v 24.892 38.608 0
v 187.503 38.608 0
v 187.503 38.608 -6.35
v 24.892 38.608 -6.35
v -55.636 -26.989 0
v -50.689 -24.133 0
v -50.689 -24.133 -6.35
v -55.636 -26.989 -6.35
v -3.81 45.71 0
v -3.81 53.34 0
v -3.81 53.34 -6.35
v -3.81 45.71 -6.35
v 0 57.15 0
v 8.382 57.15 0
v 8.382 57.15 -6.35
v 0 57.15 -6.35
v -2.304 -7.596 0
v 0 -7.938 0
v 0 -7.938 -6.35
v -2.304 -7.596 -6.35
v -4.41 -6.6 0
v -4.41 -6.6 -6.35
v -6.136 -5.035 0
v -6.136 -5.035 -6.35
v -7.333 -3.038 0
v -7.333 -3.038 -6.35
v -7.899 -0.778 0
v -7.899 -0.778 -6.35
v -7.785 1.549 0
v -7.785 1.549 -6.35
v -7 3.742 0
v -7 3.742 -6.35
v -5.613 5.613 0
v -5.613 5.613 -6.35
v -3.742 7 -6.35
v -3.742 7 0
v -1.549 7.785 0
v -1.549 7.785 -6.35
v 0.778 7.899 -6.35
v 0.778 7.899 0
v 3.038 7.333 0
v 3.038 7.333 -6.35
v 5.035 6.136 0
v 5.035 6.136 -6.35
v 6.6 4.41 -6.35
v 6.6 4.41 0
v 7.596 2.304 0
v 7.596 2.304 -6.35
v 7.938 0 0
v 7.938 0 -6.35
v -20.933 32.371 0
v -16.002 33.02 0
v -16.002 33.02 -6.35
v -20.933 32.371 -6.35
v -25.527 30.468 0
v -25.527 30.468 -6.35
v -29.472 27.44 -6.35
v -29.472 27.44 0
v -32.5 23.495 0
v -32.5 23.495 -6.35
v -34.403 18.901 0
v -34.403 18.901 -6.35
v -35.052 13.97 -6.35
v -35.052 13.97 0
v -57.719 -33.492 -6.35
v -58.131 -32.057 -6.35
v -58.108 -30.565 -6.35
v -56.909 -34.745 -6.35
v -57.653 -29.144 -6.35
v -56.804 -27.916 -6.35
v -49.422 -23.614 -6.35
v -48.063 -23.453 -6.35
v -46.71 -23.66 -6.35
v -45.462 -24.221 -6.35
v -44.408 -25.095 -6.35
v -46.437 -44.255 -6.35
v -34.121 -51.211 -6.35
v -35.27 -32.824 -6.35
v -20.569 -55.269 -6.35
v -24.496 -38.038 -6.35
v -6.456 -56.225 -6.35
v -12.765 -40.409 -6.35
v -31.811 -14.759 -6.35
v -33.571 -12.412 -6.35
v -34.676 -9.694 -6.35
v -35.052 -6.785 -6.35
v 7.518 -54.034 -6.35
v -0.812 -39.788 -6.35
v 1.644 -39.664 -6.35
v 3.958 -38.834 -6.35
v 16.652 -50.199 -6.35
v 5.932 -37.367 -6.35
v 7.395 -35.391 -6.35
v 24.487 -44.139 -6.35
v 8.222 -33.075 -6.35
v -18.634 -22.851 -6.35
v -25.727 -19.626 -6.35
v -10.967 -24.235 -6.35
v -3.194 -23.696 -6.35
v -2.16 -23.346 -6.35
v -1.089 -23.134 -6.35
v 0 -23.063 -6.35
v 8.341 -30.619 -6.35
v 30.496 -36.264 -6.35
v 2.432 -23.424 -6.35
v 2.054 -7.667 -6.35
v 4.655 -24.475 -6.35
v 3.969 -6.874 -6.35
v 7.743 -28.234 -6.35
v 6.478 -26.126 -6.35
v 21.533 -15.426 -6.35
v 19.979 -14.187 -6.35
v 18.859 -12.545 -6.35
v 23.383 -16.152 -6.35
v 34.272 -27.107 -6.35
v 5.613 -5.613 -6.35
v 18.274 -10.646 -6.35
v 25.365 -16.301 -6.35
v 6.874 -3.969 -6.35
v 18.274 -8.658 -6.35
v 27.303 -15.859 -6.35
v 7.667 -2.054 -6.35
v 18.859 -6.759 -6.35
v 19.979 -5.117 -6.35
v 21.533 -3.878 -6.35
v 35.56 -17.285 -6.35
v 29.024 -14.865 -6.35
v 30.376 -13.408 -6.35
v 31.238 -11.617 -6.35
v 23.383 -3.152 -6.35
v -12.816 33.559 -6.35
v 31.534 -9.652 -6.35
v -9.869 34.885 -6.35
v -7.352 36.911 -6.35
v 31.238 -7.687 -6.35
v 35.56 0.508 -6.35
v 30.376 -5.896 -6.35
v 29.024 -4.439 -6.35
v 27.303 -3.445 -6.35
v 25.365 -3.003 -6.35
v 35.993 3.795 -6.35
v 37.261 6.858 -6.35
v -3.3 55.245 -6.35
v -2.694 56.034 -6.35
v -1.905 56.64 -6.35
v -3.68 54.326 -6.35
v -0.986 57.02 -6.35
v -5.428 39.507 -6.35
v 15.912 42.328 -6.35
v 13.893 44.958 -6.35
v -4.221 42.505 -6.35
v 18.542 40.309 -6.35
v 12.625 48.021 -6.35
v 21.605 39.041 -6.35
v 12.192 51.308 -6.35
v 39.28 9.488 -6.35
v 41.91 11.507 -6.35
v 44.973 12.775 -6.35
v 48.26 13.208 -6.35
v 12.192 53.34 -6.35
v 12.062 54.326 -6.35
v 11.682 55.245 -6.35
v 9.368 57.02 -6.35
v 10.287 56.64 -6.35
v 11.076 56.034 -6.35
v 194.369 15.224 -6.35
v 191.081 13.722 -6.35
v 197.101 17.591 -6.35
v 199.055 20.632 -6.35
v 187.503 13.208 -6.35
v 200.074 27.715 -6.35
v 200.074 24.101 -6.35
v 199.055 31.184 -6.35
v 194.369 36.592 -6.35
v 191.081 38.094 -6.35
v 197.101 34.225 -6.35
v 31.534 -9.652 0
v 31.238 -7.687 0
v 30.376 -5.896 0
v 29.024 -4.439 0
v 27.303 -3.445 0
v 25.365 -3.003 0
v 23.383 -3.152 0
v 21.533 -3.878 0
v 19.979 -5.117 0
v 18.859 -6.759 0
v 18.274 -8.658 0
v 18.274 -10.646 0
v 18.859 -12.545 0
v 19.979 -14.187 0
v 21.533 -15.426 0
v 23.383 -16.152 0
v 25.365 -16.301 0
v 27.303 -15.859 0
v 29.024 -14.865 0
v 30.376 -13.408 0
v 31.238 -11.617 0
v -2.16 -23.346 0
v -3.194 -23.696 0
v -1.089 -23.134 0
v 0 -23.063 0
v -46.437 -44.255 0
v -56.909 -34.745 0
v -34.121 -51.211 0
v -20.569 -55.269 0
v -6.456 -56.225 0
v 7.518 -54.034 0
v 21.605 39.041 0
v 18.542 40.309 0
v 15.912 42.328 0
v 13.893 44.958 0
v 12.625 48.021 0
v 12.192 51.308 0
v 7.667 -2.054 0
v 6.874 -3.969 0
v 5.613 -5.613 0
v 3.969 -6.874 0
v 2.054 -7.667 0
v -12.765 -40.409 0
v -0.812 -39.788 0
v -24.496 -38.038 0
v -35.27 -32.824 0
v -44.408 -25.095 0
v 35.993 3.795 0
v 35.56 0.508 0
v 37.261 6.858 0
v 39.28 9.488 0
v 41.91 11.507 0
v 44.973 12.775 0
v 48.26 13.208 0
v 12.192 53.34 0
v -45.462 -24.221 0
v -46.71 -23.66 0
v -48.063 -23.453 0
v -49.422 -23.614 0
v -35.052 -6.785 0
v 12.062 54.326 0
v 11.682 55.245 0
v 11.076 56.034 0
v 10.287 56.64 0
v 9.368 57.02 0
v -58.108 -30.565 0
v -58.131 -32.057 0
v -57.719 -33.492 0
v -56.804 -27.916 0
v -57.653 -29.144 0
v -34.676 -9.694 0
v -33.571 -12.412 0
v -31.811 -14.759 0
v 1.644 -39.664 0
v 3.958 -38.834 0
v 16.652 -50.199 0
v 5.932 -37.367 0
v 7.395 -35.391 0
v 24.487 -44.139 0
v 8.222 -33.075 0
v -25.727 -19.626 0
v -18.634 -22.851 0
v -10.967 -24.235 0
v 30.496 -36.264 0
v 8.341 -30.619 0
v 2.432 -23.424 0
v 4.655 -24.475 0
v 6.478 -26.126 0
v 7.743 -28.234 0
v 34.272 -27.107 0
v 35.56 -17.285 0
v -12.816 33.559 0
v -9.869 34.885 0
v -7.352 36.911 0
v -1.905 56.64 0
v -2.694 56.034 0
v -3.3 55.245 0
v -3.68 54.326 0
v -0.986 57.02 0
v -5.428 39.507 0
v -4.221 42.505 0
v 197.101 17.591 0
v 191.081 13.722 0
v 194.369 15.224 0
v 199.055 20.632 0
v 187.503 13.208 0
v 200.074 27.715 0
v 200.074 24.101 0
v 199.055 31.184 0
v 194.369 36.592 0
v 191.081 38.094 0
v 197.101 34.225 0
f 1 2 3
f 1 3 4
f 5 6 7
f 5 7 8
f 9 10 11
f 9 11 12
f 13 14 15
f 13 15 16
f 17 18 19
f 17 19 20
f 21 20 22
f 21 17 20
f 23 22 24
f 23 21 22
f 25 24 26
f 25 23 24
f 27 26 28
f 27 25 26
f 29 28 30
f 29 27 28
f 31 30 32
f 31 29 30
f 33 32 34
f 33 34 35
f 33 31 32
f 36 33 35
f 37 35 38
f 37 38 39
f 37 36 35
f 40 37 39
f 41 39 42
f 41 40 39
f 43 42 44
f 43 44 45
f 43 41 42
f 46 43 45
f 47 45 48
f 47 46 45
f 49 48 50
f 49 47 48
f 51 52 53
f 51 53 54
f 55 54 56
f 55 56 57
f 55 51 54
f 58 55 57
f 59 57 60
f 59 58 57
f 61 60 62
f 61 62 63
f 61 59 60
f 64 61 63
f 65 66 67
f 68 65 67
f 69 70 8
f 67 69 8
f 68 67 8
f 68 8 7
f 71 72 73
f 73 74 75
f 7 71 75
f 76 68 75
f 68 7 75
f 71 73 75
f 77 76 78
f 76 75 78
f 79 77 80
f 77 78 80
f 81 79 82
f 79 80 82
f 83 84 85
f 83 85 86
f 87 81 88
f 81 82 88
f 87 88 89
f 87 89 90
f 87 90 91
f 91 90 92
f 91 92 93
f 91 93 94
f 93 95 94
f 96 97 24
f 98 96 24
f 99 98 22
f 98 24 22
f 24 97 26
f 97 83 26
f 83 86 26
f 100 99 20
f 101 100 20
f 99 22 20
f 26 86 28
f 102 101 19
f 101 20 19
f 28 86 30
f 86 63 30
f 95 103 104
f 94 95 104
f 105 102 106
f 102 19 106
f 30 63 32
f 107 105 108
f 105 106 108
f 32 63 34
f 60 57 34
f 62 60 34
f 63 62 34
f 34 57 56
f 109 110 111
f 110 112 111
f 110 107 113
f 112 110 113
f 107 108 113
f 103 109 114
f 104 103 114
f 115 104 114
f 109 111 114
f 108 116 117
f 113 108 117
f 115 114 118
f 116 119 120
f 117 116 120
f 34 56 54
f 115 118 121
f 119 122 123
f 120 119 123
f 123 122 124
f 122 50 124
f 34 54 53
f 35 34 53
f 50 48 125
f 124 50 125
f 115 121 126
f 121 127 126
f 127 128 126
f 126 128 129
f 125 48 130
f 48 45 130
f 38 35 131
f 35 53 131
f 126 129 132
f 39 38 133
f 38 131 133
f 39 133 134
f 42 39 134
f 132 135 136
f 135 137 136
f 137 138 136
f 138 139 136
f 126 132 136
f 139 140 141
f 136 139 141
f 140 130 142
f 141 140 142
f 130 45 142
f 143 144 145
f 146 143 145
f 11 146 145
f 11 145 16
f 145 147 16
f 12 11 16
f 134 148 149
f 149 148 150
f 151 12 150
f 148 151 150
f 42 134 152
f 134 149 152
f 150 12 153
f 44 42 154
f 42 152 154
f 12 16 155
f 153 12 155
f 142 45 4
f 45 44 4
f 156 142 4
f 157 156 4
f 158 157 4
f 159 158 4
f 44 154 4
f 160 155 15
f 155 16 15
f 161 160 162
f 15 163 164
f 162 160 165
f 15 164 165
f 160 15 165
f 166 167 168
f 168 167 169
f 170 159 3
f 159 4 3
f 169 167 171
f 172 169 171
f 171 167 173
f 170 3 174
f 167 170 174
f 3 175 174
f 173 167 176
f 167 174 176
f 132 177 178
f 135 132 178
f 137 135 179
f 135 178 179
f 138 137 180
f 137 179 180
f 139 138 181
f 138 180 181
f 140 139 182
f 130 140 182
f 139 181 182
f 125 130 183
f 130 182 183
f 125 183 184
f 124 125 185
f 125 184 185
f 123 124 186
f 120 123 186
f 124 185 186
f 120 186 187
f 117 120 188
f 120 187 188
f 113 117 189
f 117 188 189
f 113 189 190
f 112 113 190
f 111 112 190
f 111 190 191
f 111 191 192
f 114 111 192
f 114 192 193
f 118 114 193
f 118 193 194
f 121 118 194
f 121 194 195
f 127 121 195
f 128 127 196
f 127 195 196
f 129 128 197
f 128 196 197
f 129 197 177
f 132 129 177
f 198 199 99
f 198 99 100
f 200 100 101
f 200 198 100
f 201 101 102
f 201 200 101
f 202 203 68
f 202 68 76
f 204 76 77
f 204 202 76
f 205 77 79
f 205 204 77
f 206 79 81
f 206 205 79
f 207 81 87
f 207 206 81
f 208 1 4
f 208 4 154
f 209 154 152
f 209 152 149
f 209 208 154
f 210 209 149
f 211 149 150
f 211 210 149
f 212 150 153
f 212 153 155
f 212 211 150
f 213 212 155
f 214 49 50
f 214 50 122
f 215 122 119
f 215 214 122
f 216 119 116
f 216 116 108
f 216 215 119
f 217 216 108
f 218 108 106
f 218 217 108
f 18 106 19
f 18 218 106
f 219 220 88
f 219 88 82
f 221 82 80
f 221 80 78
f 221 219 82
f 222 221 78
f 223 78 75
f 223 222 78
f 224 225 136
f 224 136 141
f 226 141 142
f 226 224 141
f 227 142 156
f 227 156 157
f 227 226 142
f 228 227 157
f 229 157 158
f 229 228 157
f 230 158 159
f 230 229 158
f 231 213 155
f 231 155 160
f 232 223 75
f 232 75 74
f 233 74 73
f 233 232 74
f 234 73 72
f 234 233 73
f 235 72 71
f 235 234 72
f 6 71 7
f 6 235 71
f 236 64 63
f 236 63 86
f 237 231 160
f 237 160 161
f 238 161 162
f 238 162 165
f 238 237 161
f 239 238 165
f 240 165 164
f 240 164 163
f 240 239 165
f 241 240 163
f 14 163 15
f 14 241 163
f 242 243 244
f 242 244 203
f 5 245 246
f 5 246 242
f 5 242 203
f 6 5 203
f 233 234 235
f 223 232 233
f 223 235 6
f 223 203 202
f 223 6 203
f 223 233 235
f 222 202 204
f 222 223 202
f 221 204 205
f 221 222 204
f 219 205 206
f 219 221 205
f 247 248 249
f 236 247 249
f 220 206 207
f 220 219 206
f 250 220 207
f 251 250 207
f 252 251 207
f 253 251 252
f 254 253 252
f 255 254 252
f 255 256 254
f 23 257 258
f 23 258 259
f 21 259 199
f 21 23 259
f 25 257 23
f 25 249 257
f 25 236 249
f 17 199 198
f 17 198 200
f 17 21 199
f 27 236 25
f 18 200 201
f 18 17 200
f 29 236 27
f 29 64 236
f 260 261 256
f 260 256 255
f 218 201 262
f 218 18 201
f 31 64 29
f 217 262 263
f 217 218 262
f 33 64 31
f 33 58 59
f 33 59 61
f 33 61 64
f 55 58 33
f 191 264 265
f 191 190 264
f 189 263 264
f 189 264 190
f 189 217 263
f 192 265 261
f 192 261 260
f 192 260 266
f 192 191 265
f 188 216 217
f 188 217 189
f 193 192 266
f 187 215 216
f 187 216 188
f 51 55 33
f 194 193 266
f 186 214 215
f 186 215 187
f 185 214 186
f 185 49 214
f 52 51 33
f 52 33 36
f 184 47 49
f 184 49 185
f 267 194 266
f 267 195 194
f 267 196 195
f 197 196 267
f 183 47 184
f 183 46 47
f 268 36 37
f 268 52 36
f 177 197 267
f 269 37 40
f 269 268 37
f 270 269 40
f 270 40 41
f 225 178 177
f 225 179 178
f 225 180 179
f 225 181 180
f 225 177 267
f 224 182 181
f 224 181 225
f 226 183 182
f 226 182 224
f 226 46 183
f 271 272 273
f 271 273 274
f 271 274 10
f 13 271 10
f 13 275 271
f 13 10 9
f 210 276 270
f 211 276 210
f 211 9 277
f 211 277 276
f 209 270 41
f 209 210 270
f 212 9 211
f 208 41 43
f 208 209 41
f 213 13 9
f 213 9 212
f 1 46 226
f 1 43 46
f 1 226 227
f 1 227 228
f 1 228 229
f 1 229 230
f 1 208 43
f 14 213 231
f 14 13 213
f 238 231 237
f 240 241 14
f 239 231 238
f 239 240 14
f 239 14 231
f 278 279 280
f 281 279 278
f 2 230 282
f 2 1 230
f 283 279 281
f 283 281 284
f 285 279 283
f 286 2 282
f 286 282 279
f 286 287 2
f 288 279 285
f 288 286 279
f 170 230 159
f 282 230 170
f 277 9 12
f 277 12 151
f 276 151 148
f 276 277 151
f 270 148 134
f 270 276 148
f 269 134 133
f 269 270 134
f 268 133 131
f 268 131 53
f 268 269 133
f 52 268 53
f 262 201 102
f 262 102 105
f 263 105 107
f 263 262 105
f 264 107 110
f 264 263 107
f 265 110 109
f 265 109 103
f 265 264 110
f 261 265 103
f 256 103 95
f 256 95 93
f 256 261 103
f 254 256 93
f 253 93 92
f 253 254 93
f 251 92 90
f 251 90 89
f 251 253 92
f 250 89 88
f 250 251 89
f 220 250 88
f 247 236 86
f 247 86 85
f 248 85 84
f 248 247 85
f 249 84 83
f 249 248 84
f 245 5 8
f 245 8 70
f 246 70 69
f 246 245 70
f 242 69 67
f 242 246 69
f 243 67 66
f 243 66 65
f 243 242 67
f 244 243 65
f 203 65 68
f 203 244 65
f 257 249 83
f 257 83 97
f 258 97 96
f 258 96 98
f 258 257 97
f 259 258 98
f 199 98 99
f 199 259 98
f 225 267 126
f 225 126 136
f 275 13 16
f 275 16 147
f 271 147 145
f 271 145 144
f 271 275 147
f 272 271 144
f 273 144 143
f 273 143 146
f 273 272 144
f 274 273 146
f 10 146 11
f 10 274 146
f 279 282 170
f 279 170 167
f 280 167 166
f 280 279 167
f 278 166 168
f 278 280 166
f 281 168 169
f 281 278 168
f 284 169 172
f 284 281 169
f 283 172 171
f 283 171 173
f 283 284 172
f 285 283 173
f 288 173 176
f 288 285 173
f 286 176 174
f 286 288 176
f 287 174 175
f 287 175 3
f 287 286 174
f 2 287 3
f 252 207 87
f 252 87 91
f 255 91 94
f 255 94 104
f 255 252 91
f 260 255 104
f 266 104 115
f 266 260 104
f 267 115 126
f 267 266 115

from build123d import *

# Parameters (mm, degrees)
F0_R     = 6.6675
F1_DEPTH = 6.35


with BuildPart() as f1:
    # F0 (on Top) → F1 (new body)
    with BuildSketch(Plane.XY):
        with BuildLine():
            ThreePointArc((0, -7.9375), (5.61266, -5.61266), (7.9375, 0))
            ThreePointArc((7.9375, 0), (-5.61266, 5.61266), (0, -7.9375))
        make_face()
        with BuildLine():
            ThreePointArc((-3.19381, -23.695523), (-1.627902, -23.2228), (0, -23.0632))
            ThreePointArc((0, -23.0632), (8.372137, -31.851707), (-0.812057, -39.787771))
            ThreePointArc((-0.812057, -39.787771), (-24.496198, -38.037618), (-44.408232, -25.094956))
            ThreePointArc((-44.408232, -25.094956), (-47.379559, -23.510637), (-50.688938, -24.132628))
            Line((-50.688938, -24.132628), (-55.635531, -26.988545))
            ThreePointArc((-55.635531, -26.988545), (-58.108455, -30.56516), (-56.908568, -34.744611))
            ThreePointArc((-56.908568, -34.744611), (-27.458308, -53.618524), (7.5184, -54.03359))
            ThreePointArc((7.5184, -54.03359), (27.748901, -40.39788), (35.56, -17.285276))
            Line((35.56, -17.285276), (35.56, 0))
            Line((35.56, 0), (35.56, 0.508))
            ThreePointArc((35.56, 0.508), (39.279744, 9.488256), (48.26, 13.208))
            Line((48.26, 13.208), (187.5028, 13.208))
            ThreePointArc((187.5028, 13.208), (200.2028, 25.908), (187.5028, 38.608))
            Line((187.5028, 38.608), (24.892, 38.608))
            ThreePointArc((24.892, 38.608), (15.911744, 42.327744), (12.192, 51.308))
            Line((12.192, 51.308), (12.192, 53.34))
            ThreePointArc((12.192, 53.34), (11.076077, 56.034077), (8.382, 57.15))
            Line((8.382, 57.15), (0, 57.15))
            ThreePointArc((0, 57.15), (-2.694077, 56.034077), (-3.81, 53.34))
            Line((-3.81, 53.34), (-3.81, 45.709836))
            ThreePointArc((-3.81, 45.709836), (-7.3519, 36.911018), (-16.002, 33.02))
            ThreePointArc((-16.002, 33.02), (-29.472384, 27.440384), (-35.052, 13.97))
            Line((-35.052, 13.97), (-35.052, -6.785096))
            ThreePointArc((-35.052, -6.785096), (-34.210819, -11.088793), (-31.811089, -14.759036))
            ThreePointArc((-31.811089, -14.759036), (-18.633931, -22.850619), (-3.19381, -23.695523))
        make_face()
        with BuildLine():
            ThreePointArc((0, -7.9375), (-5.61266, 5.61266), (7.9375, 0))
            ThreePointArc((7.9375, 0), (5.61266, -5.61266), (0, -7.9375))
        make_face(mode=Mode.SUBTRACT)
        with Locations((24.8666, -9.652)):
            Circle(F0_R, mode=Mode.SUBTRACT)
    extrude(amount=-F1_DEPTH)


solid = f1.part
